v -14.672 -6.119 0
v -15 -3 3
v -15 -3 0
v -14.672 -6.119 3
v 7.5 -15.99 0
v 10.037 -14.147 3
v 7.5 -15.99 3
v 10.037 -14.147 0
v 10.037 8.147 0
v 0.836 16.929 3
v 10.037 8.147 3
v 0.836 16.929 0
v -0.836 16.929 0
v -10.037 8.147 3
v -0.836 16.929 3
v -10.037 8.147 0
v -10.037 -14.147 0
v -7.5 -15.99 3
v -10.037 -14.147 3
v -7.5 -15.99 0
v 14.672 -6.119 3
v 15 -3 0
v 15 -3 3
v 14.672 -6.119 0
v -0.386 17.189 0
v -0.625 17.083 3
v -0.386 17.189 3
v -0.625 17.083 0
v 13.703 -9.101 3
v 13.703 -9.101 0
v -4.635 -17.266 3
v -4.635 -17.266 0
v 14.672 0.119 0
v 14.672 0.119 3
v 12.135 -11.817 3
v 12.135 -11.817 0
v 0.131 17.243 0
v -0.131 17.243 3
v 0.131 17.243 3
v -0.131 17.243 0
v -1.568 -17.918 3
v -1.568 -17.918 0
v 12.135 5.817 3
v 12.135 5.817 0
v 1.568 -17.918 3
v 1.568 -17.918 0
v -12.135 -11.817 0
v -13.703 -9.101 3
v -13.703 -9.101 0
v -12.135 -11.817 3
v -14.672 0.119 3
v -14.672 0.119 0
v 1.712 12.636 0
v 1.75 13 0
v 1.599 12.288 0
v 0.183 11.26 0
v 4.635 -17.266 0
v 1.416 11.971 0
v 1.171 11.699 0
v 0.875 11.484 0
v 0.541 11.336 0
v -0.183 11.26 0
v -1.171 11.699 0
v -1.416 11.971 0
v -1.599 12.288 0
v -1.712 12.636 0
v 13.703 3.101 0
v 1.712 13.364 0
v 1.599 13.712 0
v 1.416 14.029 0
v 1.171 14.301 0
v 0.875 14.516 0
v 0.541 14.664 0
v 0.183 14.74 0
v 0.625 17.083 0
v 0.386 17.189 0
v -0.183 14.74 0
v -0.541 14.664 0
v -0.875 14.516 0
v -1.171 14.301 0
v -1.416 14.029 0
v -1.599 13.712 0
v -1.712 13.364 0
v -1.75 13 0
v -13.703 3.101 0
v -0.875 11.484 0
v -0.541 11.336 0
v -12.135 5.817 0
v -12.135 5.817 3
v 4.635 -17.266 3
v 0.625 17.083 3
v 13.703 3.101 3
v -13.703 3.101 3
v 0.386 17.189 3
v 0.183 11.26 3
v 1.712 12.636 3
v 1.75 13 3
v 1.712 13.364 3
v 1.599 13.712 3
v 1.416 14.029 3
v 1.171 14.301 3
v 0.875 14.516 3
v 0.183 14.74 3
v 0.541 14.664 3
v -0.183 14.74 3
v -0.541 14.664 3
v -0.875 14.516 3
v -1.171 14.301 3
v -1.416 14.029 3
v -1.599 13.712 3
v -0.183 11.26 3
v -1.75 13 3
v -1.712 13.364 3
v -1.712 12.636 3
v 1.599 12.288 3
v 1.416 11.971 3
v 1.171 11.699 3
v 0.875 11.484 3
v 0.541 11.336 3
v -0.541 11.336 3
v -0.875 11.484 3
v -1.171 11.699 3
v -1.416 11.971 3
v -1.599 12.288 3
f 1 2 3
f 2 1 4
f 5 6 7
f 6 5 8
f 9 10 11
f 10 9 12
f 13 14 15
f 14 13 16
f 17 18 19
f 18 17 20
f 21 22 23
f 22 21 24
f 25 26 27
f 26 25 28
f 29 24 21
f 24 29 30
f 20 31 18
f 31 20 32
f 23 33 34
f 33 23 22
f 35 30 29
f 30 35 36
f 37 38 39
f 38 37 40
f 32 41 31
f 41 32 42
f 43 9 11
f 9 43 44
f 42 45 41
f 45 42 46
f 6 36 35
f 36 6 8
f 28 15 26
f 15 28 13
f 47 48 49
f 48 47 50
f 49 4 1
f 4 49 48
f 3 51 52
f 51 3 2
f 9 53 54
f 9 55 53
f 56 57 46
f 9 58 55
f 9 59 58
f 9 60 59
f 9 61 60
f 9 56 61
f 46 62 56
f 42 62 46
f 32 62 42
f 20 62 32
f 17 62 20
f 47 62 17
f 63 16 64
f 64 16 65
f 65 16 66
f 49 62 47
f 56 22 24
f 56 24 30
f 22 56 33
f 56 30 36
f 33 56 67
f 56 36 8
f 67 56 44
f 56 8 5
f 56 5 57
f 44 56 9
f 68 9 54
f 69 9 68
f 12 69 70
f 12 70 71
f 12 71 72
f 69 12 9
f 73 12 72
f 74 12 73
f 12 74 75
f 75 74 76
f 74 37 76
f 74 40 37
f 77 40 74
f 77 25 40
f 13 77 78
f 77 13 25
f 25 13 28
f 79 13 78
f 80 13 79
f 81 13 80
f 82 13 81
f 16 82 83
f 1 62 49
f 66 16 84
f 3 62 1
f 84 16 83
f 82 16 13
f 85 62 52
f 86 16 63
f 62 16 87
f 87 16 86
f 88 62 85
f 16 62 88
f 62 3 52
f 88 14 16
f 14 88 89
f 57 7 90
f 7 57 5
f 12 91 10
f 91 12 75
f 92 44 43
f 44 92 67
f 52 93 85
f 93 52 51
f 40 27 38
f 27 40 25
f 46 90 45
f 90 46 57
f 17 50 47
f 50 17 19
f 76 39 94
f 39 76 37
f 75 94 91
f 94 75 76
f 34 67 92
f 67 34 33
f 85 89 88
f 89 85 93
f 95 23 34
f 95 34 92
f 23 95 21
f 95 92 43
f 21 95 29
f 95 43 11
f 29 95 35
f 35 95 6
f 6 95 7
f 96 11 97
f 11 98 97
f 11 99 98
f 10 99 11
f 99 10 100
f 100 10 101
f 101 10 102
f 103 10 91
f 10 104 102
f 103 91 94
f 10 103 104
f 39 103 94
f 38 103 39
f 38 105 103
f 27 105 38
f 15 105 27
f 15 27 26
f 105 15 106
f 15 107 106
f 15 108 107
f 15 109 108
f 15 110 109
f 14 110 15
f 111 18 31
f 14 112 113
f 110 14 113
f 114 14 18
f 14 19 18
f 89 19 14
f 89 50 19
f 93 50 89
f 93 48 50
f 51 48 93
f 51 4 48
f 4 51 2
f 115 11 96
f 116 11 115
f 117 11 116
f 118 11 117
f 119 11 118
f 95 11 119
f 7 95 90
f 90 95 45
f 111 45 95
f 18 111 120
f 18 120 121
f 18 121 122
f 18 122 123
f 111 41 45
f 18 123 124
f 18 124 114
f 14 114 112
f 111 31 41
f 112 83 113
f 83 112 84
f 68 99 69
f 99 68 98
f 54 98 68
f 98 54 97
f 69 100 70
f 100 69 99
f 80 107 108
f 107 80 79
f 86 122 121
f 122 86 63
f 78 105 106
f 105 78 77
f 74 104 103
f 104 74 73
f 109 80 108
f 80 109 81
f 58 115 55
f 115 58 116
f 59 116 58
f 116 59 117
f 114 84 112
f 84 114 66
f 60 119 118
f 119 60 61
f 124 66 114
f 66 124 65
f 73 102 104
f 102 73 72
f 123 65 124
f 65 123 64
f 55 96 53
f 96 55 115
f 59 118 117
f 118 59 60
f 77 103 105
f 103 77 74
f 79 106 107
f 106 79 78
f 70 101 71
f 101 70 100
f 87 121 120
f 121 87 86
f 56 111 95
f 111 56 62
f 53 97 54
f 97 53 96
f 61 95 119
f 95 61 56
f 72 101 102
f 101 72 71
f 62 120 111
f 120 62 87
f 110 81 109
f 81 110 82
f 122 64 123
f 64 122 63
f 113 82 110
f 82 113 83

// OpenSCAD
// Llavero/Token ResinCAT3D
// Licencia (CC) BY - SA
// By: ResinCAT3D Team

// Nota: Se necesita la versión 2015.03
// o superior de OpenSCAD para generarlo 

// Escala 1:10 = 3 x 3.5 cm 
escala = 0.1 ; 

// Agujero para el llavero
// true = activado / false = desactivado
Agujero = true ; 
// Diámetro del agujero
DA = 35 ;

// Altura de la base
hbase = 30 ;

module tokenkeychain(){
    //Base
    color("DimGray")
    difference(){
        hull(){
            translate([0,-30,0])
            cylinder(d=300,h=hbase);
            translate([0,160,0])
            cylinder(d=25,h=hbase);
        }
        if (Agujero==true){
            translate([0,130,-1])
            cylinder(d=DA,h=hbase+2);
        }
    }
    //Logo
    color("LimeGreen")
    translate([0,-30,0])
    difference(){
        surface("ResinCat3D-logo.png",center=true);
        // Eliminar capa negra inferior
        cube([400,400,3],center=true);
    }
}

// Generar Token escalado
scale(escala)
tokenkeychain();
